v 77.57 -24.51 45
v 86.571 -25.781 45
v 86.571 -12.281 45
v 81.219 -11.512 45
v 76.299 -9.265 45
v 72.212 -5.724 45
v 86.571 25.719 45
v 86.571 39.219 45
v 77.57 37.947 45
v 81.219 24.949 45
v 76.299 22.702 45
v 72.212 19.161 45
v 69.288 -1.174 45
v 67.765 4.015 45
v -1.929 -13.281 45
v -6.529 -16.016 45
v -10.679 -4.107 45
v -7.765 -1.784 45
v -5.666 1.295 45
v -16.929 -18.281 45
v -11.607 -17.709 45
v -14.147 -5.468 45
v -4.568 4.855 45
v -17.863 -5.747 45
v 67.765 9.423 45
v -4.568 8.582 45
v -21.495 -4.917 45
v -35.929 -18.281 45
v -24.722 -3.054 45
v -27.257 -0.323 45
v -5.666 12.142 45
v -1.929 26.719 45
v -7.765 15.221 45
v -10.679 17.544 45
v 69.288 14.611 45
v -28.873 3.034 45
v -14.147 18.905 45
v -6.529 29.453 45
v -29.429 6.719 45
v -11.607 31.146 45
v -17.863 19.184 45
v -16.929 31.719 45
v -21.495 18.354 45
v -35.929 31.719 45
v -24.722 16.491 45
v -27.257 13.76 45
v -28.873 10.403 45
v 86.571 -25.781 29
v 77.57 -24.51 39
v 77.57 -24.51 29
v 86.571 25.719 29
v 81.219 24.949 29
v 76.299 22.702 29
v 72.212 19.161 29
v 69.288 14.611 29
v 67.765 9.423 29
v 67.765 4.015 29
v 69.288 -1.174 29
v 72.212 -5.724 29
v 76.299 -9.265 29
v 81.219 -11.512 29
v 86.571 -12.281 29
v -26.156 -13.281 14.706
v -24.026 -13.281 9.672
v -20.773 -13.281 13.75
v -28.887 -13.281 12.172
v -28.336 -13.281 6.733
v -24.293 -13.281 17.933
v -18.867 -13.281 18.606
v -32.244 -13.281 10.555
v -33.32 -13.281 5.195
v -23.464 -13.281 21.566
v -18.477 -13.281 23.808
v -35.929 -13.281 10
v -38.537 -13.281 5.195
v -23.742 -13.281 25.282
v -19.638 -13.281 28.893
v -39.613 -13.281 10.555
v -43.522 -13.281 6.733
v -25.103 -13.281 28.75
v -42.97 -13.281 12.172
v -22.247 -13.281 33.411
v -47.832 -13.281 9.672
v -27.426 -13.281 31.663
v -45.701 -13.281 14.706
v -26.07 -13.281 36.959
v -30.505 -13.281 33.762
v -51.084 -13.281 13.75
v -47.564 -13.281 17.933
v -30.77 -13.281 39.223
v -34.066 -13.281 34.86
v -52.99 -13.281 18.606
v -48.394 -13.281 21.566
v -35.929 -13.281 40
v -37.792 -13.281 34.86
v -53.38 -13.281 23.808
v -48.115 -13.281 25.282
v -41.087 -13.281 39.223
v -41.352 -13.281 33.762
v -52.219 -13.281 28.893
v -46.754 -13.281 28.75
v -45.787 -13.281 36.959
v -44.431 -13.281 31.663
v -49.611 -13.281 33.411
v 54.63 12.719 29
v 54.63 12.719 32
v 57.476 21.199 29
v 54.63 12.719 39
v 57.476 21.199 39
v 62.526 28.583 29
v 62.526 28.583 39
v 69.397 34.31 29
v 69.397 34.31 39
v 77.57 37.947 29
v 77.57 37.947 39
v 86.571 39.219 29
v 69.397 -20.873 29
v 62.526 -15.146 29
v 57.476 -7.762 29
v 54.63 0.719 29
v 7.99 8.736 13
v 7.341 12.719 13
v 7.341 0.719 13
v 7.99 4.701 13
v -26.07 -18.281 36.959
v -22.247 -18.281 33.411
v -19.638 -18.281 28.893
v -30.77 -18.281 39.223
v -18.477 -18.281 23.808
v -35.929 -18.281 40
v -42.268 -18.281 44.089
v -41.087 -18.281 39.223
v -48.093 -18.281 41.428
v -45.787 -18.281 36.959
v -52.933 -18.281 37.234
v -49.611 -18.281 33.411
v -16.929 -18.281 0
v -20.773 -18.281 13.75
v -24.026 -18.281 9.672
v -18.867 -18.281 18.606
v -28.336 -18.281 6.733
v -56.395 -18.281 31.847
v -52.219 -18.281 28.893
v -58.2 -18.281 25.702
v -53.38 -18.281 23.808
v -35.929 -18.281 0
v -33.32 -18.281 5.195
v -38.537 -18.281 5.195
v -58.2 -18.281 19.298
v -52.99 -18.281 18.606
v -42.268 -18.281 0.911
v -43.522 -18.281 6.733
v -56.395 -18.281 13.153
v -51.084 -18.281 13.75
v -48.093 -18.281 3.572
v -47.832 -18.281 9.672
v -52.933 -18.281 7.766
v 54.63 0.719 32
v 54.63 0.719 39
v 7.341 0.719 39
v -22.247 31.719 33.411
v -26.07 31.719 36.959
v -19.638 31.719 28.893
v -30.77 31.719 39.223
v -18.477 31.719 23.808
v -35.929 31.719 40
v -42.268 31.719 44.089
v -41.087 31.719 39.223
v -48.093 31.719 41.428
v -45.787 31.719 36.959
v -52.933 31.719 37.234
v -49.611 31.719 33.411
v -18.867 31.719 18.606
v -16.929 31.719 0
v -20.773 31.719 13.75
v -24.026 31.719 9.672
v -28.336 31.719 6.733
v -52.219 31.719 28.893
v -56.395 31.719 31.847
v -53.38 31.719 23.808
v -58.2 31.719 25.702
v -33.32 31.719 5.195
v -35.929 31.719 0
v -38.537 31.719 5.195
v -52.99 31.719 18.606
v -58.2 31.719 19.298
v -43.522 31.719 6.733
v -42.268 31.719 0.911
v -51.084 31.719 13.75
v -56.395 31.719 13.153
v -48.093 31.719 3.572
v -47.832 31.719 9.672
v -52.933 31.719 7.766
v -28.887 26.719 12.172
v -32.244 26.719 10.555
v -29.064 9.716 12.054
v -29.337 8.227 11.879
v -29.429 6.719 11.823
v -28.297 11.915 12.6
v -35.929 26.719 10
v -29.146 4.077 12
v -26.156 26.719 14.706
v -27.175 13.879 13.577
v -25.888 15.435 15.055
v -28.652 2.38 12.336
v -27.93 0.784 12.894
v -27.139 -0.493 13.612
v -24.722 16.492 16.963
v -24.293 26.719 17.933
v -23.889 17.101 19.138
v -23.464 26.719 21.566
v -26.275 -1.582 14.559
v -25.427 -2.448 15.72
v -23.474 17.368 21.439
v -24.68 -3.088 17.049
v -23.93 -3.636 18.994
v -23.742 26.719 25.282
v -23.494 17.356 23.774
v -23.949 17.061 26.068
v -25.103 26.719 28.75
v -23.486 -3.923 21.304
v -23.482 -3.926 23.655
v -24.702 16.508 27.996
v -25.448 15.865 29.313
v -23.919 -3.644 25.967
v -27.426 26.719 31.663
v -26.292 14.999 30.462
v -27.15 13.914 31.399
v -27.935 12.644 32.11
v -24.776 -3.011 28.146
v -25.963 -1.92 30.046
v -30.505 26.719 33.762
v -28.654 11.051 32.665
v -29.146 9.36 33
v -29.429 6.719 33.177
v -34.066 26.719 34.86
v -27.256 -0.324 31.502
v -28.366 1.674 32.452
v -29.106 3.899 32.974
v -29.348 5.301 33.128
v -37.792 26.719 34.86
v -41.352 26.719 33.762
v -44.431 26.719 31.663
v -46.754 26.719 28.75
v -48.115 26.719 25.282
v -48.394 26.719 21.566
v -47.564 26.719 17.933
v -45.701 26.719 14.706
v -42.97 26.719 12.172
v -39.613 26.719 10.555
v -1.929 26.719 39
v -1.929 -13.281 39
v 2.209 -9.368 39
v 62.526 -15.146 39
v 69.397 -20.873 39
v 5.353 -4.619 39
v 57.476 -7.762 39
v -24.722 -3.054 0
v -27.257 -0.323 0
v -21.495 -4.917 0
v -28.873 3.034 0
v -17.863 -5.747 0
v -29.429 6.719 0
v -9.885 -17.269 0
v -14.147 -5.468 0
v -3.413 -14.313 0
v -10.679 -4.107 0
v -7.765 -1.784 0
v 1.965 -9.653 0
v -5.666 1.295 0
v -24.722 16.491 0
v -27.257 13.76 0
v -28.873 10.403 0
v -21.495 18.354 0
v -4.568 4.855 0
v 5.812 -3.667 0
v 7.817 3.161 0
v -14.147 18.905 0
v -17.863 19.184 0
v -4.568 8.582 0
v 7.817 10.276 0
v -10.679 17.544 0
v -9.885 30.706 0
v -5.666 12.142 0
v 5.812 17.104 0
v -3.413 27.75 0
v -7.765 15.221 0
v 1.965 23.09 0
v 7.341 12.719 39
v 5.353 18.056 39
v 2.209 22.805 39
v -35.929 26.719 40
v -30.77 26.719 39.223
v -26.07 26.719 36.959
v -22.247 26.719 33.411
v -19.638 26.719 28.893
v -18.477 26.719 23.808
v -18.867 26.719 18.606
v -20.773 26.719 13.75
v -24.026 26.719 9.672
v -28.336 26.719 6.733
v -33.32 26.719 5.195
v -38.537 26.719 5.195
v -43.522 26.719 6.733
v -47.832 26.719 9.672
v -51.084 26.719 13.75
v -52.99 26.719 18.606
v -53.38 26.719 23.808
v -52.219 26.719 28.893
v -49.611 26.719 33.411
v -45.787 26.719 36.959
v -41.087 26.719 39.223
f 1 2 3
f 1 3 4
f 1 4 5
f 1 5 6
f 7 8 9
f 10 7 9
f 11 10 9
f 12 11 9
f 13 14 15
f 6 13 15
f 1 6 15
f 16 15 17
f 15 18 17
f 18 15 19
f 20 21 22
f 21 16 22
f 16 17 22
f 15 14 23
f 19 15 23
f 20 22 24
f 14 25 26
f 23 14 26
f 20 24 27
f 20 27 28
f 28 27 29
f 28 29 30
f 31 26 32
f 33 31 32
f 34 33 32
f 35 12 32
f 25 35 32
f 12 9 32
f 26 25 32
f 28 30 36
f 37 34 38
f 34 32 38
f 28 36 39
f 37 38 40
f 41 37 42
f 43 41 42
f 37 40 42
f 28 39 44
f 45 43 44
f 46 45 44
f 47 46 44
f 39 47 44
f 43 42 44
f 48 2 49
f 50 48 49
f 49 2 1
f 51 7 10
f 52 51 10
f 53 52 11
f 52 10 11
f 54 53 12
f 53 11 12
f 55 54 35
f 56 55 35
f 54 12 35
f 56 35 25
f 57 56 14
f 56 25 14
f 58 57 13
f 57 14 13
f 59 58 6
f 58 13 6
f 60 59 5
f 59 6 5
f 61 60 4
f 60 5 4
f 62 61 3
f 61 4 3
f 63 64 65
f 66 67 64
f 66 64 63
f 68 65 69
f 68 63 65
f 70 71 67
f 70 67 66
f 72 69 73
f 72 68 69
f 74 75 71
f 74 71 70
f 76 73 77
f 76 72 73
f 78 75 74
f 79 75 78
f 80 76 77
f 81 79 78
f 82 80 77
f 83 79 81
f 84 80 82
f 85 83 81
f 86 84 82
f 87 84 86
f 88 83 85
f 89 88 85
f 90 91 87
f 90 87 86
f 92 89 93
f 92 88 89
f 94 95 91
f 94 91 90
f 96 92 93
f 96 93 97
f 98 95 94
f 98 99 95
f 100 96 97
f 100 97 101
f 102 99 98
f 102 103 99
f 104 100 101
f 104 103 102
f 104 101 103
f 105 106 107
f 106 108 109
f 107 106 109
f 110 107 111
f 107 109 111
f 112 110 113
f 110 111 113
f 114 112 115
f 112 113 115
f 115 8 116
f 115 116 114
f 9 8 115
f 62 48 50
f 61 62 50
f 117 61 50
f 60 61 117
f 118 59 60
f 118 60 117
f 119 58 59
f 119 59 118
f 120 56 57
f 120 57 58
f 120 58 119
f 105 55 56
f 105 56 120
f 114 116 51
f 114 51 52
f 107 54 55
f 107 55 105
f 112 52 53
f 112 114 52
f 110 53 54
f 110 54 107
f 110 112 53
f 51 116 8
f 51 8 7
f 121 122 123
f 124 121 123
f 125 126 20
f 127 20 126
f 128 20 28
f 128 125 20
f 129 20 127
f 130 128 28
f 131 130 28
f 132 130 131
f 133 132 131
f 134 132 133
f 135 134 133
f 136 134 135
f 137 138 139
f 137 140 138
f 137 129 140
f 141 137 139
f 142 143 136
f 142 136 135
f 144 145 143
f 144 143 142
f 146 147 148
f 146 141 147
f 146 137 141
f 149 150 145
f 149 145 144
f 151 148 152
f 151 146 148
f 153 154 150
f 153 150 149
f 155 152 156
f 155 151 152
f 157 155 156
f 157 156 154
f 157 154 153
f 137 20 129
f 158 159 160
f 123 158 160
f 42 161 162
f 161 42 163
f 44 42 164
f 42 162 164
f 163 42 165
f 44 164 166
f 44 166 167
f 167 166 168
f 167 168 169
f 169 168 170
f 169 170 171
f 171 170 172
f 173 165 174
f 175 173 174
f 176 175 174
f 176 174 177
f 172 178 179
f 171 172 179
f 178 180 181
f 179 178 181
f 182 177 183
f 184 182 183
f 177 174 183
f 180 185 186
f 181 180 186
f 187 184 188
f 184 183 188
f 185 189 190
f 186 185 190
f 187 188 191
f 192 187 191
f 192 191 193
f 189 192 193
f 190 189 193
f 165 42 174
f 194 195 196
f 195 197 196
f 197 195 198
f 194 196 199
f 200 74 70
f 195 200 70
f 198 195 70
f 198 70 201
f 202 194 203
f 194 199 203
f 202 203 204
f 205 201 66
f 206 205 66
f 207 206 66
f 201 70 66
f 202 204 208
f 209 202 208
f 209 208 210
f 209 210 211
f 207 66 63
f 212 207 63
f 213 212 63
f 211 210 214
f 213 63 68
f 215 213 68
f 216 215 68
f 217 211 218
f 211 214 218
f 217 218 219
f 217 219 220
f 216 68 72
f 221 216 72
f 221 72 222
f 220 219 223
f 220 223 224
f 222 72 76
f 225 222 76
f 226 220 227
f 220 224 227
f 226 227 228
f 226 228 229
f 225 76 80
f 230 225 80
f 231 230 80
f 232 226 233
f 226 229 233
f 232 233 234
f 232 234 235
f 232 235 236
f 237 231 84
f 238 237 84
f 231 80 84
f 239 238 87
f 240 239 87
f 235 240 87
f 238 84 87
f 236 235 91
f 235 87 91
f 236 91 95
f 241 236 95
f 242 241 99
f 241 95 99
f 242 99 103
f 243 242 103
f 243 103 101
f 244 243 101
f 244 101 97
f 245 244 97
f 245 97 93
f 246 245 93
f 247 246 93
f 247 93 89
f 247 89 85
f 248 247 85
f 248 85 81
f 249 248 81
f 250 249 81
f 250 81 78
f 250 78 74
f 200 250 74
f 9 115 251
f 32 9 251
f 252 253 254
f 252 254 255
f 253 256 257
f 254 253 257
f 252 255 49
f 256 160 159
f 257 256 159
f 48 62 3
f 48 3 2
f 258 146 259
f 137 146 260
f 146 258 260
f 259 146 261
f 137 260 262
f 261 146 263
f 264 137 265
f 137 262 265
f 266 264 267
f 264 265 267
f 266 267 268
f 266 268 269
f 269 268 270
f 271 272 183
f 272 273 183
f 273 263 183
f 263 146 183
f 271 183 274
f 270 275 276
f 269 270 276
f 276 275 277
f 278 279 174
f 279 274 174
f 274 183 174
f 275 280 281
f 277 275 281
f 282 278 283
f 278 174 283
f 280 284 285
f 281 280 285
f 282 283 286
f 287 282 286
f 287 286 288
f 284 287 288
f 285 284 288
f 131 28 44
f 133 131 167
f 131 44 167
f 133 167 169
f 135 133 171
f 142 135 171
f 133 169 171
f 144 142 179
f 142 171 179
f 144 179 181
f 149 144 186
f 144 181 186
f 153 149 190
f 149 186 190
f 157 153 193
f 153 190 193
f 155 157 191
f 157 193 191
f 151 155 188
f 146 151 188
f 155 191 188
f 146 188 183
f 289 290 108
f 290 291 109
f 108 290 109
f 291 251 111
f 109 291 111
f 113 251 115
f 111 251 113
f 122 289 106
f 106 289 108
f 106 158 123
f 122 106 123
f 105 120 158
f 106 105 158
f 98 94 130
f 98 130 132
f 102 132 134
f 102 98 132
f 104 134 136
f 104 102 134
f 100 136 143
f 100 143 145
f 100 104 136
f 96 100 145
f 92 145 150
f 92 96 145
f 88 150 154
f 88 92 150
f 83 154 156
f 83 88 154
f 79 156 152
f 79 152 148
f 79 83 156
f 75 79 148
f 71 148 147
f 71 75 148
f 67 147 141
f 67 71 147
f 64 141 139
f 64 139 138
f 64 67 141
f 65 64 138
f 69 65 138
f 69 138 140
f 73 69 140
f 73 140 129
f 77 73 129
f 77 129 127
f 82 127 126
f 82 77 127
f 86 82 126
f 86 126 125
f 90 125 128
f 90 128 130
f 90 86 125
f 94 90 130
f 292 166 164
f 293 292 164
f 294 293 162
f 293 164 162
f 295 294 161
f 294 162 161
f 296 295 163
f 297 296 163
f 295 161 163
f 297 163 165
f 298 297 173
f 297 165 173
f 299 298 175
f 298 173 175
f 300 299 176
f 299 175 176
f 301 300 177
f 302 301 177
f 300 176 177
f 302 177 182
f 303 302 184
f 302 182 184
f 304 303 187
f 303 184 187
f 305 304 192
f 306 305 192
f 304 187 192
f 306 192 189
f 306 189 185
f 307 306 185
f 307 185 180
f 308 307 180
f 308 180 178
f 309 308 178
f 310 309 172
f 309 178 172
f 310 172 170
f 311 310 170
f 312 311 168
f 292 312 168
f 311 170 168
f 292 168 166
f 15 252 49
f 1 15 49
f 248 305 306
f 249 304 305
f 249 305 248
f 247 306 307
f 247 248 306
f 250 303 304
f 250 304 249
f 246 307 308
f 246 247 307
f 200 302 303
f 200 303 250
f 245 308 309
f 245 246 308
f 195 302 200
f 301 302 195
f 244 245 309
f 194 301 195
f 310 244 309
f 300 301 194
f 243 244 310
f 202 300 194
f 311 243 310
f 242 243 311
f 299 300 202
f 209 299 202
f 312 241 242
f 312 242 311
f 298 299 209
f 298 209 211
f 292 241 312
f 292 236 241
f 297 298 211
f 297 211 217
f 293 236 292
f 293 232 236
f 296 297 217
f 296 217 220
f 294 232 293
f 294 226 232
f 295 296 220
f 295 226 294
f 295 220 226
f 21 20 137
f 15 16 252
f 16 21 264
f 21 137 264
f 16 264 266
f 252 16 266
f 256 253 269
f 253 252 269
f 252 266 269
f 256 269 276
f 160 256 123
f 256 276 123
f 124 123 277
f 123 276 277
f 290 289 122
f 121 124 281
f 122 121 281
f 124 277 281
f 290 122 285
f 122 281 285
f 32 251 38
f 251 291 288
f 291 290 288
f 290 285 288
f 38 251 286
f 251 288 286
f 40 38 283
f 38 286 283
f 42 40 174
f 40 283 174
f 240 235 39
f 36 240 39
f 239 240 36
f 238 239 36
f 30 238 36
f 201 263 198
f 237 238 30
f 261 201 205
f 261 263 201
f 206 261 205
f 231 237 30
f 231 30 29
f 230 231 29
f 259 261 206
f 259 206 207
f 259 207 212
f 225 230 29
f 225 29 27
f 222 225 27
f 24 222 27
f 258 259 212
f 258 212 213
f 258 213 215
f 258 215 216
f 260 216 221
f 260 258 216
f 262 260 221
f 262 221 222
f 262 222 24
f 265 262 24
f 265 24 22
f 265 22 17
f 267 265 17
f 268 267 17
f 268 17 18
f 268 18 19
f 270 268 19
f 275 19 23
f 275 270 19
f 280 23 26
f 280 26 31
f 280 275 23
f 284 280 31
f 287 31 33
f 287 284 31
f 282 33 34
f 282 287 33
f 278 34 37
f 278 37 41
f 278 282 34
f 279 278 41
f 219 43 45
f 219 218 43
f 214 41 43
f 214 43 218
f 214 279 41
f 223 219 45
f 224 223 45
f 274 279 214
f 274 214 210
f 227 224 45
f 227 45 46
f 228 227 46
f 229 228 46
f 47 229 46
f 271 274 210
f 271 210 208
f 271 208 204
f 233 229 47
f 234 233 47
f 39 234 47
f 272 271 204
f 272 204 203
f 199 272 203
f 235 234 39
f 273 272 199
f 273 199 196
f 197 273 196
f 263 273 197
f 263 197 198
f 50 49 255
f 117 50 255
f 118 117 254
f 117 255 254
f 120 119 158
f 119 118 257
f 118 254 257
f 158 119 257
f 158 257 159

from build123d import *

# Parameters (mm, degrees)
SKETCH1_R           = 12.5
BOSS_EXTRUDE1_DEPTH = 45
BOSS_EXTRUDE2_DEPTH = 50
SKETCH4_R           = 17.5
CUT_EXTRUDE1_DEPTH  = 5
CUT_EXTRUDE2_START  = -5
SKETCH5_R           = 17.5
CUT_EXTRUDE2_DEPTH  = 5
SKETCH6_R           = 12.5
CUT_EXTRUDE3_DEPTH  = 96
BOSS_EXTRUDE3_DEPTH = 16
BOSS_EXTRUDE4_START = -6
BOSS_EXTRUDE4_DEPTH = 6
BOSS_EXTRUDE5_DEPTH = 26
CUT_EXTRUDE6_DEPTH  = 27
CUT_EXTRUDE13_DEPTH = 45
CUT_EXTRUDE14_DEPTH = 45


with BuildPart() as part:
    # Sketch1 → Boss-Extrude1 (new body)
    with BuildSketch(Plane.XY):
        with BuildLine():
            Line((-16.9285558, 31.718520583), (-35.9285558, 31.718520583))
            Line((-35.9285558, 31.718520583), (-35.9285558, -18.281479417))
            Line((-35.9285558, -18.281479417), (-16.9285558, -18.281479417))
            ThreePointArc((-16.9285558, -18.281479417), (8.0714442, 6.718520583), (-16.9285558, 31.718520583))
        make_face()
        with Locations(Location((-16.9285558, 6.718520583, 0), (0, 0, 180))):
            Circle(SKETCH1_R, mode=Mode.SUBTRACT)
    extrude(amount=BOSS_EXTRUDE1_DEPTH)

    # Sketch2 → Boss-Extrude2 (add)
    with BuildSketch(Plane(origin=(0, 31.718520583, 0), x_dir=(1, 0, 0), z_dir=(0, 1, 0))):
        with BuildLine():
            Line((-35.9285558, 0), (-35.9285558, -45))
            ThreePointArc((-35.9285558, -45), (-58.4285558, -22.5), (-35.9285558, 0))
        make_face()
    extrude(amount=-BOSS_EXTRUDE2_DEPTH)

    # Sketch4 → Cut-Extrude1 (cut)
    with BuildSketch(Plane(origin=(0, 31.718520583, 0), x_dir=(1, 0, 0), z_dir=(0, 1, 0))):
        with Locations(Location((-35.9285558, -22.5, 0), (0, 0, 270))):
            Circle(SKETCH4_R)
    extrude(amount=-CUT_EXTRUDE1_DEPTH, mode=Mode.SUBTRACT)

    # Sketch5 → Cut-Extrude2 (cut)
    with BuildSketch(Plane.XZ.offset(18.281479417).offset(CUT_EXTRUDE2_START)):
        with Locations(Location((-35.9285558, 22.5, 0), (0, 0, 90))):
            Circle(SKETCH5_R)
    extrude(amount=CUT_EXTRUDE2_DEPTH, mode=Mode.SUBTRACT)

    # Sketch6 → Cut-Extrude3 (cut)
    with BuildSketch(Plane.XZ.offset(13.281479417)):
        with Locations(Location((-35.9285558, 22.5, 0), (0, 0, 270))):
            Circle(SKETCH6_R)
    extrude(amount=-CUT_EXTRUDE3_DEPTH, mode=Mode.SUBTRACT)



with BuildPart() as body_2:
    # Sketch7 → Boss-Extrude3 (new body)
    with BuildSketch(Plane.XY.offset(45)):
        with BuildLine():
            Line((86.5714442, 39.218520583), (86.5714442, 25.718520583))
            ThreePointArc((86.5714442, 25.718520583), (67.5714442, 6.718520583), (86.5714442, -12.281479417))
            Line((86.5714442, -12.281479417), (86.5714442, -25.781479417))
            ThreePointArc((86.5714442, -25.781479417), (54.0714442, 6.718520583), (86.5714442, 39.218520583))
        make_face()
    extrude(amount=-BOSS_EXTRUDE3_DEPTH)


with BuildPart() as part_1:
    add(part.part)

    add(body_2.part)  # Boss-Extrude4 merges body 2
    # Sketch8 → Boss-Extrude4 (add)
    with BuildSketch(Plane.XY.offset(45).offset(BOSS_EXTRUDE4_START)):
        with BuildLine():
            Line((77.570223695, 37.947161755), (-1.9285558, 26.718520583))
            ThreePointArc((-1.9285558, 26.718520583), (8.0714442, 6.718520583), (-1.9285558, -13.281479417))
            Line((-1.9285558, -13.281479417), (77.570223695, -24.510120588))
            ThreePointArc((77.570223695, -24.510120588), (54.0714442, 6.718520583), (77.570223695, 37.947161755))
        make_face()
    extrude(amount=BOSS_EXTRUDE4_DEPTH)

    # Sketch11 → Boss-Extrude5 (add)
    with BuildSketch(Plane(origin=(0, 0, 39), x_dir=(-1, 0, 0), z_dir=(0, 0, -1))):
        with BuildLine():
            Line((-7.340766399, 12.718520583), (-54.630091692, 12.718520583))
            ThreePointArc((-54.630091692, 12.718520583), (-54.0714442, 6.718520583), (-54.630091692, 0.718520583))
            Line((-54.630091692, 0.718520583), (-7.340766399, 0.718520583))
            ThreePointArc((-7.340766399, 0.718520583), (-8.0714442, 6.718520583), (-7.340766399, 12.718520583))
        make_face()
    extrude(amount=BOSS_EXTRUDE5_DEPTH)

    # Sketch12 → Cut-Extrude6 (cut)
    with BuildSketch(Plane.XZ.offset(-0.718520583)):
        Polygon((54.630091692, 32), (7.340766399, 13), (54.630091692, 13), align=None)
    extrude(amount=-CUT_EXTRUDE6_DEPTH, mode=Mode.SUBTRACT)

    # Sketch22 → Cut-Extrude13 (cut)
    with BuildSketch(Plane.XY.offset(45)):
        Polygon((86.5714442, 39.218520583), (77.570223695, 37.947161755), (65.199967012, 56.955266835), (110.383312753, 52.793642885), align=None)
    extrude(amount=-CUT_EXTRUDE13_DEPTH, mode=Mode.SUBTRACT)

    # Sketch23 → Cut-Extrude14 (cut)
    with BuildSketch(Plane.XY.offset(45)):
        Polygon((86.5714442, -25.781479417), (77.570223695, -24.510120588), (41.145903609, -43.152647533), (115.929494314, -52.929136625), align=None)
    extrude(amount=-CUT_EXTRUDE14_DEPTH, mode=Mode.SUBTRACT)


solid = part_1.part
